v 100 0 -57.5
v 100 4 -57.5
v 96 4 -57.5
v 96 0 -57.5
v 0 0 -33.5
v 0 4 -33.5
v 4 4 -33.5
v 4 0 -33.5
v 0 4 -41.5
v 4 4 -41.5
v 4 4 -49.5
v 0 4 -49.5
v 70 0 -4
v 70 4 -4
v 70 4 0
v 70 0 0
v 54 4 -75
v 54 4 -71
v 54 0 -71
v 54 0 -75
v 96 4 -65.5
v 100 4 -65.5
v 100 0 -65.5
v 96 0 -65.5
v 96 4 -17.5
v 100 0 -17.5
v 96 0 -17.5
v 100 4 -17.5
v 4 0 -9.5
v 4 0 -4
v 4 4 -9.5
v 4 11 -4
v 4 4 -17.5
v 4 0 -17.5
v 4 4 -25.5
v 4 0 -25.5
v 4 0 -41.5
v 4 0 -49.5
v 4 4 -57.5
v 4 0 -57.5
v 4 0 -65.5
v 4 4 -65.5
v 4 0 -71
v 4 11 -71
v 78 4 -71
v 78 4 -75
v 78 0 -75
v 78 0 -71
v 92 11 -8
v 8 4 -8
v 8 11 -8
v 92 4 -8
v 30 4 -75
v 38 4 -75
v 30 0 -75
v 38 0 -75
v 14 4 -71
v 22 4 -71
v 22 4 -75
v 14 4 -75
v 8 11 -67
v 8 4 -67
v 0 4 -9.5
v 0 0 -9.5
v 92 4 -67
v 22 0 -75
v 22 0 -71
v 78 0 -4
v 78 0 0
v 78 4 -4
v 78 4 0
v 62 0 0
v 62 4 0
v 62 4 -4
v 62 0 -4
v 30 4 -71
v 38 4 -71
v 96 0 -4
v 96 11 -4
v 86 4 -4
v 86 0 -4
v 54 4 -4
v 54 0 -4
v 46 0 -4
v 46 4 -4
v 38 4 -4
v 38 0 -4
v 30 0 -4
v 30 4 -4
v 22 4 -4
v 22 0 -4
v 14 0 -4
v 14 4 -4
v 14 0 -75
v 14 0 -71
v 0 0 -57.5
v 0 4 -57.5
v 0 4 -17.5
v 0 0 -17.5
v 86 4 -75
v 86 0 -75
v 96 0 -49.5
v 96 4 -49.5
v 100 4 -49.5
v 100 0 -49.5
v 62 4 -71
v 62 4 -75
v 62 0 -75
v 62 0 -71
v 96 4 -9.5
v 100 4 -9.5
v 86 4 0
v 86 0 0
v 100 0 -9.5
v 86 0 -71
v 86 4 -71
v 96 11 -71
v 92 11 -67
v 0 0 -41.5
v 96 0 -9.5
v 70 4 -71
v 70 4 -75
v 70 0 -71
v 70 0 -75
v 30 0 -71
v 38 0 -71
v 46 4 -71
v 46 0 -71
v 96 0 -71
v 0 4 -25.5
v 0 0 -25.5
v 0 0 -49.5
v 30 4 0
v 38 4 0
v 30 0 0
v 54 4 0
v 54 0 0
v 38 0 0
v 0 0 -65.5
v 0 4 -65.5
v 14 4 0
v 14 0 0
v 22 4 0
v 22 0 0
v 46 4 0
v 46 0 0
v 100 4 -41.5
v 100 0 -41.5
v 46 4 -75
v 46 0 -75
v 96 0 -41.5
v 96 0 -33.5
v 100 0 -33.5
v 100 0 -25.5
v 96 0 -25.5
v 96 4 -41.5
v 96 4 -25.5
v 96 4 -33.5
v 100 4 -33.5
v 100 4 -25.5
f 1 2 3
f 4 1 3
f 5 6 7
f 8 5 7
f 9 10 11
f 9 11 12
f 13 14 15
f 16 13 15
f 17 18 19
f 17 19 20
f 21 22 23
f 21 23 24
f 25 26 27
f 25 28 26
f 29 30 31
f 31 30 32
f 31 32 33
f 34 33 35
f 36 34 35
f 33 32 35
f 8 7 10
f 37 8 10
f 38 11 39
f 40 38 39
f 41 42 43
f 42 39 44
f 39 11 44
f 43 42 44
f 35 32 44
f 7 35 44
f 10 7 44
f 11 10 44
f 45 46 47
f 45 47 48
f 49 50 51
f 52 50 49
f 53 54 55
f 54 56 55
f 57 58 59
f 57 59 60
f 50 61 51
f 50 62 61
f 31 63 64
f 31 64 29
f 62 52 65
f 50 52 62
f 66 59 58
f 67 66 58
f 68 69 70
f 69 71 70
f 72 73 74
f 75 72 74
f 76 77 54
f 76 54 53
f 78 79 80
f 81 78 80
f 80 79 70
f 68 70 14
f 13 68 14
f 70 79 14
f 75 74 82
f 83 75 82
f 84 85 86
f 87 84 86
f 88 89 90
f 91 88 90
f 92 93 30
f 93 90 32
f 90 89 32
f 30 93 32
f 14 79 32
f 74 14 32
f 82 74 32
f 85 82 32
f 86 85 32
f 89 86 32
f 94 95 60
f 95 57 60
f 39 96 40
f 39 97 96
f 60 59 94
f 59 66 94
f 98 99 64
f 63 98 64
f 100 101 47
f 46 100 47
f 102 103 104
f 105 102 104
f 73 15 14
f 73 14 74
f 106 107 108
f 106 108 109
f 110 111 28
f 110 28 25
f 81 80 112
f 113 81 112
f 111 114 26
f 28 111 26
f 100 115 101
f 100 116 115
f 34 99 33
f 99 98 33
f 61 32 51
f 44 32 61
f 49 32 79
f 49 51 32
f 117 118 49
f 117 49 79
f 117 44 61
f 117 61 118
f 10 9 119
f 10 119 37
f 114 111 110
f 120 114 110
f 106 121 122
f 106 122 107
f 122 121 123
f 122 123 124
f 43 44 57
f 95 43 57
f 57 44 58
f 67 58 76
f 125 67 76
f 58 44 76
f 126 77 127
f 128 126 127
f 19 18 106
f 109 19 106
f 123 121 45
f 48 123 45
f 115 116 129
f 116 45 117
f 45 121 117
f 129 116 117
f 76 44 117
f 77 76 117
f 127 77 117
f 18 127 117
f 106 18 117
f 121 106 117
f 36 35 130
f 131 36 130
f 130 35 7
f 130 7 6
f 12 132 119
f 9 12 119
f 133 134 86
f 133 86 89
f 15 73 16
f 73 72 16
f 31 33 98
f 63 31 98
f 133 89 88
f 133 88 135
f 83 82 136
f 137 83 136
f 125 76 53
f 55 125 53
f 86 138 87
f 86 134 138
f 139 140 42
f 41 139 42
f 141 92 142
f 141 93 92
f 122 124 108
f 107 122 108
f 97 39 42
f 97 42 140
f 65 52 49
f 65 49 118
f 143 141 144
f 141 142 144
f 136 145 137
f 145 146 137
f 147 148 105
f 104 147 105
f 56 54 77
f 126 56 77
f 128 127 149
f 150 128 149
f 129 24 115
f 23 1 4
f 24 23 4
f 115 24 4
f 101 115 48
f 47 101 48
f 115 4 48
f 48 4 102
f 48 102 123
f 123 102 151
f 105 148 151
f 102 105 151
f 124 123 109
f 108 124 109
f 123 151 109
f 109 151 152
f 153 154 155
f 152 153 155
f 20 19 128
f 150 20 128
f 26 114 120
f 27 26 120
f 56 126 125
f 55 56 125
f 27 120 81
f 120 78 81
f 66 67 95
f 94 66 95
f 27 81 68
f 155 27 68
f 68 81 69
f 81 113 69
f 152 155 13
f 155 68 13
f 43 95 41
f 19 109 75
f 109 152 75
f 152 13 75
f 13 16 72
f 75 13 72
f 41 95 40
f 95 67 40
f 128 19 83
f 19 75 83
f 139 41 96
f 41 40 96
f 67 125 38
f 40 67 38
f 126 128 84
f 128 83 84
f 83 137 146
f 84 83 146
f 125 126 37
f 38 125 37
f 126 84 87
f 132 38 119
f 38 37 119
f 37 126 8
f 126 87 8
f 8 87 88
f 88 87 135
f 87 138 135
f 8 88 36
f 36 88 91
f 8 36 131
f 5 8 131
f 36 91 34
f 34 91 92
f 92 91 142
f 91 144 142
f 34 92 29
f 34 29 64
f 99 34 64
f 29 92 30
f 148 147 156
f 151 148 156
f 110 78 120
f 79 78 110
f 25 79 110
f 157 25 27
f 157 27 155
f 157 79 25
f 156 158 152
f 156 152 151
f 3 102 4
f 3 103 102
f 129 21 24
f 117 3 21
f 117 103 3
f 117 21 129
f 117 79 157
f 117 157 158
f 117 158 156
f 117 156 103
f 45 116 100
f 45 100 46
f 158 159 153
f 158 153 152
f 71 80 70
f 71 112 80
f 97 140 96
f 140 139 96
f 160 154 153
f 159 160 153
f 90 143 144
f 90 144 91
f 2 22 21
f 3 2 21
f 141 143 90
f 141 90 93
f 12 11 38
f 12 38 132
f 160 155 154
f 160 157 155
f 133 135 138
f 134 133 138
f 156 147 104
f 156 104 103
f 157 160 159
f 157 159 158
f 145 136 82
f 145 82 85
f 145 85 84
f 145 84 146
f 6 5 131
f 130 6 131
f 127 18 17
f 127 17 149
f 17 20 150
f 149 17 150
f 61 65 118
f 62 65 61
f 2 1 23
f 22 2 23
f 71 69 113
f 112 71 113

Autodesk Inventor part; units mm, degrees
ref_plane "YZ Plane" through (0, 0, 0) normal (1, 0, 0) x (0, 1, 0)
ref_plane "XZ Plane" through (0, 0, 0) normal (0, 1, 0) x (-1, 0, 0)
ref_plane "XY Plane" through (0, 0, 0) normal (0, 0, 1) x (1, 0, 0)
sketch "Sketch1" plane through (0, 0, 0) normal (0, 1, 0) x (-1, 0, 0)
  line L0 (0, 0) -> (-100, 0)
  line L1 (-100, 0) -> (-100, -75)
  line L2 (-100, -75) -> (0, -75)
  line L3 (0, -75) -> (0, 0)
  dimension "d0" = 100
  dimension "d1" = 75
extrude "Extrusion1" add sketch "Sketch1" along normal blind 4
sketch "Sketch2" plane through (0, 4, 0) normal (0, 1, 0) x (1, 0, 0)
  line L0 (0, 0) -> (100, 0) construction
  line L1 (100, 0) -> (100, 75) construction
  line L2 (100, 75) -> (0, 75) construction
  line L3 (0, 75) -> (0, 0) construction
  line L4 (4, 71) -> (96, 71)
  line L5 (96, 71) -> (96, 4)
  line L6 (96, 4) -> (4, 4)
  line L7 (4, 4) -> (4, 71)
  line L8 (92, 67) -> (8, 67)
  line L9 (8, 67) -> (8, 8)
  line L10 (8, 8) -> (92, 8)
  line L11 (92, 8) -> (92, 67)
  dimension "d4" = 4
  dimension "d5" = 4
extrude "Extrusion2" add sketch "Sketch2" along normal blind 7
sketch "Sketch3" plane through (0, 4, 0) normal (0, 1, 0) x (1, 0, 0)
  line L0 (100, 75) -> (0, 75) construction
  line L1 (0, 75) -> (0, 0) construction
  line L2 (0, 0) -> (100, 0) construction
  line L3 (100, 0) -> (100, 75) construction
  line L4 (4, 71) -> (96, 71) construction
  line L5 (96, 71) -> (96, 4) construction
  line L6 (96, 4) -> (4, 4) construction
  line L7 (4, 4) -> (4, 71) construction
  line L8 (0, 37.5) -> (100, 37.5) construction
  line L9 (50, 75) -> (50, 0) construction
  line L10 (0, 65.5) -> (4, 65.5)
  line L11 (4, 65.5) -> (4, 71)
  line L12 (4, 71) -> (14, 71)
  line L13 (4, 71) -> (96, 71) projected
  line L14 (14, 71) -> (14, 75)
  line L15 (14, 75) -> (0, 75)
  line L16 (0, 75) -> (0, 65.5)
  line L17 (0, 57.5) -> (4, 57.5)
  line L18 (4, 57.5) -> (4, 49.5)
  line L19 (4, 71) -> (4, 4) projected
  line L20 (4, 49.5) -> (0, 49.5)
  line L21 (0, 49.5) -> (0, 57.5)
  line L22 (0, 41.5) -> (4, 41.5)
  line L23 (4, 37.5) -> (4, 41.5)
  line L24 (0, 41.5) -> (0, 37.5)
  line L25 (22, 75) -> (22, 71)
  line L26 (22, 71) -> (30, 71)
  line L27 (30, 71) -> (30, 75)
  line L28 (30, 75) -> (22, 75)
  line L29 (38, 75) -> (38, 71)
  line L30 (38, 71) -> (46, 71)
  line L31 (46, 71) -> (46, 75)
  line L32 (46, 75) -> (38, 75)
  line L33 (0, 9.5) -> (4, 9.5)
  line L34 (4, 9.5) -> (4, 4)
  line L35 (4, 4) -> (14, 4)
  line L36 (14, 4) -> (14, 0)
  line L37 (14, 0) -> (0, 0)
  line L38 (0, 0) -> (0, 9.5)
  line L39 (0, 17.5) -> (4, 17.5)
  line L40 (4, 17.5) -> (4, 25.5)
  line L41 (4, 25.5) -> (0, 25.5)
  line L42 (0, 25.5) -> (0, 17.5)
  line L43 (0, 33.5) -> (4, 33.5)
  line L44 (4, 37.5) -> (4, 33.5)
  line L45 (0, 33.5) -> (0, 37.5)
  line L46 (22, 0) -> (22, 4)
  line L47 (22, 4) -> (30, 4)
  line L48 (30, 4) -> (30, 0)
  line L49 (30, 0) -> (22, 0)
  line L50 (38, 0) -> (38, 4)
  line L51 (38, 4) -> (46, 4)
  line L52 (46, 4) -> (46, 0)
  line L53 (46, 0) -> (38, 0)
  line L54 (100, 75) -> (100, 0) construction
  line L55 (96, 4) -> (96, 71) construction
  line L56 (100, 65.5) -> (96, 65.5)
  line L57 (96, 65.5) -> (96, 71)
  line L58 (96, 71) -> (86, 71)
  line L59 (86, 71) -> (86, 75)
  line L60 (86, 75) -> (100, 75)
  line L61 (100, 75) -> (100, 65.5)
  line L62 (100, 57.5) -> (96, 57.5)
  line L63 (96, 57.5) -> (96, 49.5)
  line L64 (96, 71) -> (96, 4)
  line L65 (96, 49.5) -> (100, 49.5)
  line L66 (100, 49.5) -> (100, 57.5)
  line L67 (100, 41.5) -> (96, 41.5)
  line L68 (96, 37.5) -> (96, 41.5)
  line L69 (100, 41.5) -> (100, 37.5)
  line L70 (78, 75) -> (78, 71)
  line L71 (78, 71) -> (70, 71)
  line L72 (70, 71) -> (70, 75)
  line L73 (70, 75) -> (78, 75)
  line L74 (62, 75) -> (62, 71)
  line L75 (62, 71) -> (54, 71)
  line L76 (54, 71) -> (54, 75)
  line L77 (54, 75) -> (62, 75)
  line L78 (78, 0) -> (78, 4)
  line L79 (70, 4) -> (70, 0)
  line L80 (78, 4) -> (70, 4)
  line L81 (70, 0) -> (78, 0)
  line L82 (54, 4) -> (54, 0)
  line L83 (62, 4) -> (54, 4)
  line L84 (54, 0) -> (62, 0)
  line L85 (62, 0) -> (62, 4)
  line L86 (96, 4) -> (86, 4)
  line L87 (100, 9.5) -> (96, 9.5)
  line L88 (96, 9.5) -> (96, 4)
  line L89 (86, 4) -> (86, 0)
  line L90 (86, 0) -> (100, 0)
  line L91 (96, 17.5) -> (96, 25.5)
  line L92 (100, 17.5) -> (96, 17.5)
  line L93 (96, 25.5) -> (100, 25.5)
  line L94 (96, 37.5) -> (96, 33.5)
  line L95 (100, 33.5) -> (96, 33.5)
  line L96 (100, 33.5) -> (100, 37.5)
  line L97 (100, 25.5) -> (100, 17.5)
  line L98 (100, 0) -> (100, 9.5)
  dimension "d9" = 8
  dimension "d11" = 4
  dimension "d12" = 8
  dimension "d13" = 8
  dimension "d14" = 8
  dimension "d15" = 8
  dimension "d16" = 8
  dimension "d17" = 4
  dimension "d18" = 8
extrude "Extrusion3" cut sketch "Sketch3" against normal up to surface (4 mm away)
properties part number "bottom" material "PBT Plastic Black"
